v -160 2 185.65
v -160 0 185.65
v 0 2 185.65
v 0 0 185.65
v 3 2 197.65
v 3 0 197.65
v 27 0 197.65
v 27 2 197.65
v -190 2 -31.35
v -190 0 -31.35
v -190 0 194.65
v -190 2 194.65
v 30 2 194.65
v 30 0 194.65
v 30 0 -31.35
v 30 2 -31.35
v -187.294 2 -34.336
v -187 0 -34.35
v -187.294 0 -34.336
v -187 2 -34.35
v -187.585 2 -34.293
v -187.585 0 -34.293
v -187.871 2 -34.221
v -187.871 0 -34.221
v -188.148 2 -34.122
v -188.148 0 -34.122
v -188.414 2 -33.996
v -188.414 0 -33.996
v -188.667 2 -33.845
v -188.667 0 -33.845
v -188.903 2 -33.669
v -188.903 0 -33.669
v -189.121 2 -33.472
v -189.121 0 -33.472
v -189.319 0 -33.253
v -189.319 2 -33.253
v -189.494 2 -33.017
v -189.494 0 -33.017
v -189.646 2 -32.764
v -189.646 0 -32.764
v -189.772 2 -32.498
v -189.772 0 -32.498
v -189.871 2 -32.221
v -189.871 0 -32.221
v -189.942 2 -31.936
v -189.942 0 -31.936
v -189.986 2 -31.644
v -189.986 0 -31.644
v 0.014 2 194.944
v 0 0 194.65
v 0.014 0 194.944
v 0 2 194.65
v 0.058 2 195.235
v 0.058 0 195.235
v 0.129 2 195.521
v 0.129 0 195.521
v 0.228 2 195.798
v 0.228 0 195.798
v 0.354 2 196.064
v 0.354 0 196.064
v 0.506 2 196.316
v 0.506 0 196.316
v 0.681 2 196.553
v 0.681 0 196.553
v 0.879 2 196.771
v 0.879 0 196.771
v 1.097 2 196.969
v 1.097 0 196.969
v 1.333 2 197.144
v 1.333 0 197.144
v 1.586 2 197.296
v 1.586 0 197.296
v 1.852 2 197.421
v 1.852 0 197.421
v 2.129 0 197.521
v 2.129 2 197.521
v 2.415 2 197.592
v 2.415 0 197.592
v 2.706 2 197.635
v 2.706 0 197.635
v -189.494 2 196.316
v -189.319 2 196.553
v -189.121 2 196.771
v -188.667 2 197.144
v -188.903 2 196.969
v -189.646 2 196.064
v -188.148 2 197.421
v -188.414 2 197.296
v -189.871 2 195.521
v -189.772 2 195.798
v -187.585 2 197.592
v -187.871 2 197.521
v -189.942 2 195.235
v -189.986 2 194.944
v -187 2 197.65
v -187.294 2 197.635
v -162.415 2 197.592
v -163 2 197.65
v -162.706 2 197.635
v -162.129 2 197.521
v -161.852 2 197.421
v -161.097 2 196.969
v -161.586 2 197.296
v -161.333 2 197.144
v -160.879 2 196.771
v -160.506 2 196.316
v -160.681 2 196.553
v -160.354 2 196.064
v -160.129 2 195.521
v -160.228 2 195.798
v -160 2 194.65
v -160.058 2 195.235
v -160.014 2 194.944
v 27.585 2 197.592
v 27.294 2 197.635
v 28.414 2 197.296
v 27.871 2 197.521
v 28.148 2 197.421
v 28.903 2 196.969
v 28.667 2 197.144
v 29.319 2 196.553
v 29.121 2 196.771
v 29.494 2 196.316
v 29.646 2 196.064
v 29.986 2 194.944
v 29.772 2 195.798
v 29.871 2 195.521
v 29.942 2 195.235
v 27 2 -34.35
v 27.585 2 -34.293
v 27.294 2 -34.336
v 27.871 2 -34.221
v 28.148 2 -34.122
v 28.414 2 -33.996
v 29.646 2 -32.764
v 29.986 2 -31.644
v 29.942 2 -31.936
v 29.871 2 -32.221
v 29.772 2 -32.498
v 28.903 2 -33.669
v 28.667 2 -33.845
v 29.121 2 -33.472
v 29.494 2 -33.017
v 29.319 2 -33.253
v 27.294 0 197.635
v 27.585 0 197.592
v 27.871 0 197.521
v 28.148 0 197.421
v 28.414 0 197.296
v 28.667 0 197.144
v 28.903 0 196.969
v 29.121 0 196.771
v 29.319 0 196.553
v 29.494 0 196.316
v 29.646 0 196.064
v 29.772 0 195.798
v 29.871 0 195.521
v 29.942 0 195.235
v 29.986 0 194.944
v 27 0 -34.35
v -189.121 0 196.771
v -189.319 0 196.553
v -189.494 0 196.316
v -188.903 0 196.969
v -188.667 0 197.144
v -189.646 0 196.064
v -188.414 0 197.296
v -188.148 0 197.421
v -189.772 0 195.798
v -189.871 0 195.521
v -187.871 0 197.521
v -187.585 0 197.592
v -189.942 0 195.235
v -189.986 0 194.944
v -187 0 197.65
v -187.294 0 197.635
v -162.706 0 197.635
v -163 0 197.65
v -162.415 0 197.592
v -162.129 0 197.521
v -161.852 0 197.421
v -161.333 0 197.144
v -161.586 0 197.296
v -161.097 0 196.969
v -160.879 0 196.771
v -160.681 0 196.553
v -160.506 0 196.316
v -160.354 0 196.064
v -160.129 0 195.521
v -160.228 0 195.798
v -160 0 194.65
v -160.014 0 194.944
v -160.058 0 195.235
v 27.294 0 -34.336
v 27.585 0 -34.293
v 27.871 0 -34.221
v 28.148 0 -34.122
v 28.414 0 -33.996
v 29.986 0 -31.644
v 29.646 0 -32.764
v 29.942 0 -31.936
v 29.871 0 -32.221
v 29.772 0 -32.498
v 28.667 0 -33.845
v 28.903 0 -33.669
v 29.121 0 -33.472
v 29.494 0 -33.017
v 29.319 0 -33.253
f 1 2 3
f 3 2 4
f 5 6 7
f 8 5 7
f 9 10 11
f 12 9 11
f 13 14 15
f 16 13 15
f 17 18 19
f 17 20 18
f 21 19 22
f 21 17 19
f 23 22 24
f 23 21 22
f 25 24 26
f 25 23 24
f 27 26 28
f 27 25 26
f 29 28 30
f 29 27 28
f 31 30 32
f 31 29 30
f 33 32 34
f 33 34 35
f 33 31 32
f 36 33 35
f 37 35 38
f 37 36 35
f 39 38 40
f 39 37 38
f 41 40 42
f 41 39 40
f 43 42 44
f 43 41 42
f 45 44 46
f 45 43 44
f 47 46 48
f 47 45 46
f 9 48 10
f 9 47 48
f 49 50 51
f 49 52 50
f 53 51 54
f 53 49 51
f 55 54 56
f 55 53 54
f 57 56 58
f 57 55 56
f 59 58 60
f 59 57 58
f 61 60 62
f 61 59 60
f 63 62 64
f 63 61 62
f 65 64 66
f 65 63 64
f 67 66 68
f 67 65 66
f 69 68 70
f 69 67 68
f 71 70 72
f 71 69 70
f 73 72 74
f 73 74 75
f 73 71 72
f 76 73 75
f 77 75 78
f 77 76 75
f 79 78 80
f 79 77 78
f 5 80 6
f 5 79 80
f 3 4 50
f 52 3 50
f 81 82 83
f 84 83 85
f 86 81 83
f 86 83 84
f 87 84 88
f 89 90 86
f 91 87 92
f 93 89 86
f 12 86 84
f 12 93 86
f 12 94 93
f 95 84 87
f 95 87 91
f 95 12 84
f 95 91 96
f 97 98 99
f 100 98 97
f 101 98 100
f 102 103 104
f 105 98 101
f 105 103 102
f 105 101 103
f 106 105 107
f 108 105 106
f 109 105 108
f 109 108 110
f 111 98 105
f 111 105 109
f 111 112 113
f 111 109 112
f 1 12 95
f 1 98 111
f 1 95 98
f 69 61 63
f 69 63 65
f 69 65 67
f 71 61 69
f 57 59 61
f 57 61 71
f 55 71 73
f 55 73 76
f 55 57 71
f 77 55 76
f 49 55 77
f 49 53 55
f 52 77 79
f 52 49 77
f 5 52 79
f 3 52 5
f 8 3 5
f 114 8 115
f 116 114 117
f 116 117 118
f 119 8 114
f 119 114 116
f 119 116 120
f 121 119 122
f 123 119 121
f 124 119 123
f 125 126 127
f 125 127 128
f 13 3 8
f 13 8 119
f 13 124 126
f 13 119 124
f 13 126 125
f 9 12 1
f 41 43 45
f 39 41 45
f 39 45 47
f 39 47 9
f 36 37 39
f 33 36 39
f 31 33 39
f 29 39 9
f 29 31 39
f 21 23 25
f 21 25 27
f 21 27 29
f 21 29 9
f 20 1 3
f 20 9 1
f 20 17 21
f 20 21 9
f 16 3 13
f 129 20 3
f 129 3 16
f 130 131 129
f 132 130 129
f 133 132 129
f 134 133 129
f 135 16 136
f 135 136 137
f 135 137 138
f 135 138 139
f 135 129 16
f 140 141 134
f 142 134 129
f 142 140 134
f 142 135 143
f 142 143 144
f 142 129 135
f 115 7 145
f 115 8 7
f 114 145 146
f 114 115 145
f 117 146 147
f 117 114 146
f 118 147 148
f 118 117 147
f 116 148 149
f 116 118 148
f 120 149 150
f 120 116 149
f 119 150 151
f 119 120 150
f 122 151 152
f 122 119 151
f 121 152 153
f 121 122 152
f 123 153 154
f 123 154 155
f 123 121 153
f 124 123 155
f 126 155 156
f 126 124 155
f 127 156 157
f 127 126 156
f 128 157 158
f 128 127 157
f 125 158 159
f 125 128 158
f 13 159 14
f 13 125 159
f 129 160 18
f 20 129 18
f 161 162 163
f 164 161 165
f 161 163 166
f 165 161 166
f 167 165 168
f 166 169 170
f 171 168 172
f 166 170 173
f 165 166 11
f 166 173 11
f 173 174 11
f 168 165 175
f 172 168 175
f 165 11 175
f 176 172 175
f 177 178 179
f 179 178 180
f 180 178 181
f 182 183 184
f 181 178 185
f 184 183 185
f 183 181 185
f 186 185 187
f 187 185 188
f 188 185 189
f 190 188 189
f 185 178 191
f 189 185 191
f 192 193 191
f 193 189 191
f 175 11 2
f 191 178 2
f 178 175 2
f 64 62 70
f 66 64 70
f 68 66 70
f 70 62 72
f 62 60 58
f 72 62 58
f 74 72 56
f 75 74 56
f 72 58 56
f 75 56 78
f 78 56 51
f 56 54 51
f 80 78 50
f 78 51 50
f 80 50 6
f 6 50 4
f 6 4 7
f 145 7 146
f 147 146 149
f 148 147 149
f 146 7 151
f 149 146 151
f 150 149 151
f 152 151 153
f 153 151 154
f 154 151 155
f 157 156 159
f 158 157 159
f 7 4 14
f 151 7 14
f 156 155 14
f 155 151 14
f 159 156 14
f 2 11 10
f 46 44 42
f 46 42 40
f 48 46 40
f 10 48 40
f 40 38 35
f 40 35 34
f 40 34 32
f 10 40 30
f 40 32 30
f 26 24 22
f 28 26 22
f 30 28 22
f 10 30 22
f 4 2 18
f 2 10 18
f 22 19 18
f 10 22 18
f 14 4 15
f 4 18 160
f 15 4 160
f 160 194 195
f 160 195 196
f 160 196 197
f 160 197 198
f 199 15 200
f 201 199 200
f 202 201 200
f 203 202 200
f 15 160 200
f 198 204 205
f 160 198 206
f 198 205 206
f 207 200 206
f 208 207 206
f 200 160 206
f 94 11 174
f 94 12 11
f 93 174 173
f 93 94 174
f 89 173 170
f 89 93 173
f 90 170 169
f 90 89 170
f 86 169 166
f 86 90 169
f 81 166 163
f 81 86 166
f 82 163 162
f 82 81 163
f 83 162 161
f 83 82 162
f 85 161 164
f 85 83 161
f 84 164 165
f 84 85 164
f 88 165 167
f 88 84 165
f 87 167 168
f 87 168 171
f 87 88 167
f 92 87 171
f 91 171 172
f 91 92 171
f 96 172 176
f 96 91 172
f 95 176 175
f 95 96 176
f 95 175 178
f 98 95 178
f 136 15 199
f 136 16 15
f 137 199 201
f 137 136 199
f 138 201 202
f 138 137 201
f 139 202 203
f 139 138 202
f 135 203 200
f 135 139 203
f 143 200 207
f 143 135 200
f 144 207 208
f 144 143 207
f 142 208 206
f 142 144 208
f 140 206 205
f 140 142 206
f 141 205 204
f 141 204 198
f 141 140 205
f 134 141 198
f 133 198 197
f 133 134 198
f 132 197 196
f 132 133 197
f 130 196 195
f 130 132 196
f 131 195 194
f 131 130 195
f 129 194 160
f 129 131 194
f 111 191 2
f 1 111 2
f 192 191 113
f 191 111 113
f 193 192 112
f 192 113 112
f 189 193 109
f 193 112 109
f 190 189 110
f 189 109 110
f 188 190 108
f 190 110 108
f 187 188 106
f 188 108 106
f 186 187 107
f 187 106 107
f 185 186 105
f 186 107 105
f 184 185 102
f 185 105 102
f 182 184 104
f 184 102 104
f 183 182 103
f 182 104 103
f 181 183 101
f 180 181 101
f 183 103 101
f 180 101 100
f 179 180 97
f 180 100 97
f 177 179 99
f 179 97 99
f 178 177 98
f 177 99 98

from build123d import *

# Parameters (mm, degrees)
BOSS_EXTRUDE1_DEPTH = 2
FILLET1_R           = 3


with BuildPart() as part:
    # Sketch1 → Boss-Extrude1 (new body)
    with BuildSketch(Plane(origin=(0, 0, 0), x_dir=(1, 0, 0), z_dir=(0, 1, 0))):
        Polygon((-160, -197.649746193), (-160, -185.649746193), (0, -185.649746193), (0, -197.649746193), (30, -197.649746193), (30, 34.350253807), (-190, 34.350253807), (-190, -197.649746193), align=None)
    extrude(amount=BOSS_EXTRUDE1_DEPTH)

    # Fillet1
    fillet1_edges = [part.edges().sort_by_distance(p)[0] for p in [
        (-190, 1, -34.350253807),
        (30, 1, -34.350253807),
        (30, 1, 197.649746193),
        (0, 1, 197.649746193),
        (-160, 1, 197.649746193),
        (-190, 1, 197.649746193),
    ]]
    fillet(fillet1_edges, radius=FILLET1_R)


solid = part.part
